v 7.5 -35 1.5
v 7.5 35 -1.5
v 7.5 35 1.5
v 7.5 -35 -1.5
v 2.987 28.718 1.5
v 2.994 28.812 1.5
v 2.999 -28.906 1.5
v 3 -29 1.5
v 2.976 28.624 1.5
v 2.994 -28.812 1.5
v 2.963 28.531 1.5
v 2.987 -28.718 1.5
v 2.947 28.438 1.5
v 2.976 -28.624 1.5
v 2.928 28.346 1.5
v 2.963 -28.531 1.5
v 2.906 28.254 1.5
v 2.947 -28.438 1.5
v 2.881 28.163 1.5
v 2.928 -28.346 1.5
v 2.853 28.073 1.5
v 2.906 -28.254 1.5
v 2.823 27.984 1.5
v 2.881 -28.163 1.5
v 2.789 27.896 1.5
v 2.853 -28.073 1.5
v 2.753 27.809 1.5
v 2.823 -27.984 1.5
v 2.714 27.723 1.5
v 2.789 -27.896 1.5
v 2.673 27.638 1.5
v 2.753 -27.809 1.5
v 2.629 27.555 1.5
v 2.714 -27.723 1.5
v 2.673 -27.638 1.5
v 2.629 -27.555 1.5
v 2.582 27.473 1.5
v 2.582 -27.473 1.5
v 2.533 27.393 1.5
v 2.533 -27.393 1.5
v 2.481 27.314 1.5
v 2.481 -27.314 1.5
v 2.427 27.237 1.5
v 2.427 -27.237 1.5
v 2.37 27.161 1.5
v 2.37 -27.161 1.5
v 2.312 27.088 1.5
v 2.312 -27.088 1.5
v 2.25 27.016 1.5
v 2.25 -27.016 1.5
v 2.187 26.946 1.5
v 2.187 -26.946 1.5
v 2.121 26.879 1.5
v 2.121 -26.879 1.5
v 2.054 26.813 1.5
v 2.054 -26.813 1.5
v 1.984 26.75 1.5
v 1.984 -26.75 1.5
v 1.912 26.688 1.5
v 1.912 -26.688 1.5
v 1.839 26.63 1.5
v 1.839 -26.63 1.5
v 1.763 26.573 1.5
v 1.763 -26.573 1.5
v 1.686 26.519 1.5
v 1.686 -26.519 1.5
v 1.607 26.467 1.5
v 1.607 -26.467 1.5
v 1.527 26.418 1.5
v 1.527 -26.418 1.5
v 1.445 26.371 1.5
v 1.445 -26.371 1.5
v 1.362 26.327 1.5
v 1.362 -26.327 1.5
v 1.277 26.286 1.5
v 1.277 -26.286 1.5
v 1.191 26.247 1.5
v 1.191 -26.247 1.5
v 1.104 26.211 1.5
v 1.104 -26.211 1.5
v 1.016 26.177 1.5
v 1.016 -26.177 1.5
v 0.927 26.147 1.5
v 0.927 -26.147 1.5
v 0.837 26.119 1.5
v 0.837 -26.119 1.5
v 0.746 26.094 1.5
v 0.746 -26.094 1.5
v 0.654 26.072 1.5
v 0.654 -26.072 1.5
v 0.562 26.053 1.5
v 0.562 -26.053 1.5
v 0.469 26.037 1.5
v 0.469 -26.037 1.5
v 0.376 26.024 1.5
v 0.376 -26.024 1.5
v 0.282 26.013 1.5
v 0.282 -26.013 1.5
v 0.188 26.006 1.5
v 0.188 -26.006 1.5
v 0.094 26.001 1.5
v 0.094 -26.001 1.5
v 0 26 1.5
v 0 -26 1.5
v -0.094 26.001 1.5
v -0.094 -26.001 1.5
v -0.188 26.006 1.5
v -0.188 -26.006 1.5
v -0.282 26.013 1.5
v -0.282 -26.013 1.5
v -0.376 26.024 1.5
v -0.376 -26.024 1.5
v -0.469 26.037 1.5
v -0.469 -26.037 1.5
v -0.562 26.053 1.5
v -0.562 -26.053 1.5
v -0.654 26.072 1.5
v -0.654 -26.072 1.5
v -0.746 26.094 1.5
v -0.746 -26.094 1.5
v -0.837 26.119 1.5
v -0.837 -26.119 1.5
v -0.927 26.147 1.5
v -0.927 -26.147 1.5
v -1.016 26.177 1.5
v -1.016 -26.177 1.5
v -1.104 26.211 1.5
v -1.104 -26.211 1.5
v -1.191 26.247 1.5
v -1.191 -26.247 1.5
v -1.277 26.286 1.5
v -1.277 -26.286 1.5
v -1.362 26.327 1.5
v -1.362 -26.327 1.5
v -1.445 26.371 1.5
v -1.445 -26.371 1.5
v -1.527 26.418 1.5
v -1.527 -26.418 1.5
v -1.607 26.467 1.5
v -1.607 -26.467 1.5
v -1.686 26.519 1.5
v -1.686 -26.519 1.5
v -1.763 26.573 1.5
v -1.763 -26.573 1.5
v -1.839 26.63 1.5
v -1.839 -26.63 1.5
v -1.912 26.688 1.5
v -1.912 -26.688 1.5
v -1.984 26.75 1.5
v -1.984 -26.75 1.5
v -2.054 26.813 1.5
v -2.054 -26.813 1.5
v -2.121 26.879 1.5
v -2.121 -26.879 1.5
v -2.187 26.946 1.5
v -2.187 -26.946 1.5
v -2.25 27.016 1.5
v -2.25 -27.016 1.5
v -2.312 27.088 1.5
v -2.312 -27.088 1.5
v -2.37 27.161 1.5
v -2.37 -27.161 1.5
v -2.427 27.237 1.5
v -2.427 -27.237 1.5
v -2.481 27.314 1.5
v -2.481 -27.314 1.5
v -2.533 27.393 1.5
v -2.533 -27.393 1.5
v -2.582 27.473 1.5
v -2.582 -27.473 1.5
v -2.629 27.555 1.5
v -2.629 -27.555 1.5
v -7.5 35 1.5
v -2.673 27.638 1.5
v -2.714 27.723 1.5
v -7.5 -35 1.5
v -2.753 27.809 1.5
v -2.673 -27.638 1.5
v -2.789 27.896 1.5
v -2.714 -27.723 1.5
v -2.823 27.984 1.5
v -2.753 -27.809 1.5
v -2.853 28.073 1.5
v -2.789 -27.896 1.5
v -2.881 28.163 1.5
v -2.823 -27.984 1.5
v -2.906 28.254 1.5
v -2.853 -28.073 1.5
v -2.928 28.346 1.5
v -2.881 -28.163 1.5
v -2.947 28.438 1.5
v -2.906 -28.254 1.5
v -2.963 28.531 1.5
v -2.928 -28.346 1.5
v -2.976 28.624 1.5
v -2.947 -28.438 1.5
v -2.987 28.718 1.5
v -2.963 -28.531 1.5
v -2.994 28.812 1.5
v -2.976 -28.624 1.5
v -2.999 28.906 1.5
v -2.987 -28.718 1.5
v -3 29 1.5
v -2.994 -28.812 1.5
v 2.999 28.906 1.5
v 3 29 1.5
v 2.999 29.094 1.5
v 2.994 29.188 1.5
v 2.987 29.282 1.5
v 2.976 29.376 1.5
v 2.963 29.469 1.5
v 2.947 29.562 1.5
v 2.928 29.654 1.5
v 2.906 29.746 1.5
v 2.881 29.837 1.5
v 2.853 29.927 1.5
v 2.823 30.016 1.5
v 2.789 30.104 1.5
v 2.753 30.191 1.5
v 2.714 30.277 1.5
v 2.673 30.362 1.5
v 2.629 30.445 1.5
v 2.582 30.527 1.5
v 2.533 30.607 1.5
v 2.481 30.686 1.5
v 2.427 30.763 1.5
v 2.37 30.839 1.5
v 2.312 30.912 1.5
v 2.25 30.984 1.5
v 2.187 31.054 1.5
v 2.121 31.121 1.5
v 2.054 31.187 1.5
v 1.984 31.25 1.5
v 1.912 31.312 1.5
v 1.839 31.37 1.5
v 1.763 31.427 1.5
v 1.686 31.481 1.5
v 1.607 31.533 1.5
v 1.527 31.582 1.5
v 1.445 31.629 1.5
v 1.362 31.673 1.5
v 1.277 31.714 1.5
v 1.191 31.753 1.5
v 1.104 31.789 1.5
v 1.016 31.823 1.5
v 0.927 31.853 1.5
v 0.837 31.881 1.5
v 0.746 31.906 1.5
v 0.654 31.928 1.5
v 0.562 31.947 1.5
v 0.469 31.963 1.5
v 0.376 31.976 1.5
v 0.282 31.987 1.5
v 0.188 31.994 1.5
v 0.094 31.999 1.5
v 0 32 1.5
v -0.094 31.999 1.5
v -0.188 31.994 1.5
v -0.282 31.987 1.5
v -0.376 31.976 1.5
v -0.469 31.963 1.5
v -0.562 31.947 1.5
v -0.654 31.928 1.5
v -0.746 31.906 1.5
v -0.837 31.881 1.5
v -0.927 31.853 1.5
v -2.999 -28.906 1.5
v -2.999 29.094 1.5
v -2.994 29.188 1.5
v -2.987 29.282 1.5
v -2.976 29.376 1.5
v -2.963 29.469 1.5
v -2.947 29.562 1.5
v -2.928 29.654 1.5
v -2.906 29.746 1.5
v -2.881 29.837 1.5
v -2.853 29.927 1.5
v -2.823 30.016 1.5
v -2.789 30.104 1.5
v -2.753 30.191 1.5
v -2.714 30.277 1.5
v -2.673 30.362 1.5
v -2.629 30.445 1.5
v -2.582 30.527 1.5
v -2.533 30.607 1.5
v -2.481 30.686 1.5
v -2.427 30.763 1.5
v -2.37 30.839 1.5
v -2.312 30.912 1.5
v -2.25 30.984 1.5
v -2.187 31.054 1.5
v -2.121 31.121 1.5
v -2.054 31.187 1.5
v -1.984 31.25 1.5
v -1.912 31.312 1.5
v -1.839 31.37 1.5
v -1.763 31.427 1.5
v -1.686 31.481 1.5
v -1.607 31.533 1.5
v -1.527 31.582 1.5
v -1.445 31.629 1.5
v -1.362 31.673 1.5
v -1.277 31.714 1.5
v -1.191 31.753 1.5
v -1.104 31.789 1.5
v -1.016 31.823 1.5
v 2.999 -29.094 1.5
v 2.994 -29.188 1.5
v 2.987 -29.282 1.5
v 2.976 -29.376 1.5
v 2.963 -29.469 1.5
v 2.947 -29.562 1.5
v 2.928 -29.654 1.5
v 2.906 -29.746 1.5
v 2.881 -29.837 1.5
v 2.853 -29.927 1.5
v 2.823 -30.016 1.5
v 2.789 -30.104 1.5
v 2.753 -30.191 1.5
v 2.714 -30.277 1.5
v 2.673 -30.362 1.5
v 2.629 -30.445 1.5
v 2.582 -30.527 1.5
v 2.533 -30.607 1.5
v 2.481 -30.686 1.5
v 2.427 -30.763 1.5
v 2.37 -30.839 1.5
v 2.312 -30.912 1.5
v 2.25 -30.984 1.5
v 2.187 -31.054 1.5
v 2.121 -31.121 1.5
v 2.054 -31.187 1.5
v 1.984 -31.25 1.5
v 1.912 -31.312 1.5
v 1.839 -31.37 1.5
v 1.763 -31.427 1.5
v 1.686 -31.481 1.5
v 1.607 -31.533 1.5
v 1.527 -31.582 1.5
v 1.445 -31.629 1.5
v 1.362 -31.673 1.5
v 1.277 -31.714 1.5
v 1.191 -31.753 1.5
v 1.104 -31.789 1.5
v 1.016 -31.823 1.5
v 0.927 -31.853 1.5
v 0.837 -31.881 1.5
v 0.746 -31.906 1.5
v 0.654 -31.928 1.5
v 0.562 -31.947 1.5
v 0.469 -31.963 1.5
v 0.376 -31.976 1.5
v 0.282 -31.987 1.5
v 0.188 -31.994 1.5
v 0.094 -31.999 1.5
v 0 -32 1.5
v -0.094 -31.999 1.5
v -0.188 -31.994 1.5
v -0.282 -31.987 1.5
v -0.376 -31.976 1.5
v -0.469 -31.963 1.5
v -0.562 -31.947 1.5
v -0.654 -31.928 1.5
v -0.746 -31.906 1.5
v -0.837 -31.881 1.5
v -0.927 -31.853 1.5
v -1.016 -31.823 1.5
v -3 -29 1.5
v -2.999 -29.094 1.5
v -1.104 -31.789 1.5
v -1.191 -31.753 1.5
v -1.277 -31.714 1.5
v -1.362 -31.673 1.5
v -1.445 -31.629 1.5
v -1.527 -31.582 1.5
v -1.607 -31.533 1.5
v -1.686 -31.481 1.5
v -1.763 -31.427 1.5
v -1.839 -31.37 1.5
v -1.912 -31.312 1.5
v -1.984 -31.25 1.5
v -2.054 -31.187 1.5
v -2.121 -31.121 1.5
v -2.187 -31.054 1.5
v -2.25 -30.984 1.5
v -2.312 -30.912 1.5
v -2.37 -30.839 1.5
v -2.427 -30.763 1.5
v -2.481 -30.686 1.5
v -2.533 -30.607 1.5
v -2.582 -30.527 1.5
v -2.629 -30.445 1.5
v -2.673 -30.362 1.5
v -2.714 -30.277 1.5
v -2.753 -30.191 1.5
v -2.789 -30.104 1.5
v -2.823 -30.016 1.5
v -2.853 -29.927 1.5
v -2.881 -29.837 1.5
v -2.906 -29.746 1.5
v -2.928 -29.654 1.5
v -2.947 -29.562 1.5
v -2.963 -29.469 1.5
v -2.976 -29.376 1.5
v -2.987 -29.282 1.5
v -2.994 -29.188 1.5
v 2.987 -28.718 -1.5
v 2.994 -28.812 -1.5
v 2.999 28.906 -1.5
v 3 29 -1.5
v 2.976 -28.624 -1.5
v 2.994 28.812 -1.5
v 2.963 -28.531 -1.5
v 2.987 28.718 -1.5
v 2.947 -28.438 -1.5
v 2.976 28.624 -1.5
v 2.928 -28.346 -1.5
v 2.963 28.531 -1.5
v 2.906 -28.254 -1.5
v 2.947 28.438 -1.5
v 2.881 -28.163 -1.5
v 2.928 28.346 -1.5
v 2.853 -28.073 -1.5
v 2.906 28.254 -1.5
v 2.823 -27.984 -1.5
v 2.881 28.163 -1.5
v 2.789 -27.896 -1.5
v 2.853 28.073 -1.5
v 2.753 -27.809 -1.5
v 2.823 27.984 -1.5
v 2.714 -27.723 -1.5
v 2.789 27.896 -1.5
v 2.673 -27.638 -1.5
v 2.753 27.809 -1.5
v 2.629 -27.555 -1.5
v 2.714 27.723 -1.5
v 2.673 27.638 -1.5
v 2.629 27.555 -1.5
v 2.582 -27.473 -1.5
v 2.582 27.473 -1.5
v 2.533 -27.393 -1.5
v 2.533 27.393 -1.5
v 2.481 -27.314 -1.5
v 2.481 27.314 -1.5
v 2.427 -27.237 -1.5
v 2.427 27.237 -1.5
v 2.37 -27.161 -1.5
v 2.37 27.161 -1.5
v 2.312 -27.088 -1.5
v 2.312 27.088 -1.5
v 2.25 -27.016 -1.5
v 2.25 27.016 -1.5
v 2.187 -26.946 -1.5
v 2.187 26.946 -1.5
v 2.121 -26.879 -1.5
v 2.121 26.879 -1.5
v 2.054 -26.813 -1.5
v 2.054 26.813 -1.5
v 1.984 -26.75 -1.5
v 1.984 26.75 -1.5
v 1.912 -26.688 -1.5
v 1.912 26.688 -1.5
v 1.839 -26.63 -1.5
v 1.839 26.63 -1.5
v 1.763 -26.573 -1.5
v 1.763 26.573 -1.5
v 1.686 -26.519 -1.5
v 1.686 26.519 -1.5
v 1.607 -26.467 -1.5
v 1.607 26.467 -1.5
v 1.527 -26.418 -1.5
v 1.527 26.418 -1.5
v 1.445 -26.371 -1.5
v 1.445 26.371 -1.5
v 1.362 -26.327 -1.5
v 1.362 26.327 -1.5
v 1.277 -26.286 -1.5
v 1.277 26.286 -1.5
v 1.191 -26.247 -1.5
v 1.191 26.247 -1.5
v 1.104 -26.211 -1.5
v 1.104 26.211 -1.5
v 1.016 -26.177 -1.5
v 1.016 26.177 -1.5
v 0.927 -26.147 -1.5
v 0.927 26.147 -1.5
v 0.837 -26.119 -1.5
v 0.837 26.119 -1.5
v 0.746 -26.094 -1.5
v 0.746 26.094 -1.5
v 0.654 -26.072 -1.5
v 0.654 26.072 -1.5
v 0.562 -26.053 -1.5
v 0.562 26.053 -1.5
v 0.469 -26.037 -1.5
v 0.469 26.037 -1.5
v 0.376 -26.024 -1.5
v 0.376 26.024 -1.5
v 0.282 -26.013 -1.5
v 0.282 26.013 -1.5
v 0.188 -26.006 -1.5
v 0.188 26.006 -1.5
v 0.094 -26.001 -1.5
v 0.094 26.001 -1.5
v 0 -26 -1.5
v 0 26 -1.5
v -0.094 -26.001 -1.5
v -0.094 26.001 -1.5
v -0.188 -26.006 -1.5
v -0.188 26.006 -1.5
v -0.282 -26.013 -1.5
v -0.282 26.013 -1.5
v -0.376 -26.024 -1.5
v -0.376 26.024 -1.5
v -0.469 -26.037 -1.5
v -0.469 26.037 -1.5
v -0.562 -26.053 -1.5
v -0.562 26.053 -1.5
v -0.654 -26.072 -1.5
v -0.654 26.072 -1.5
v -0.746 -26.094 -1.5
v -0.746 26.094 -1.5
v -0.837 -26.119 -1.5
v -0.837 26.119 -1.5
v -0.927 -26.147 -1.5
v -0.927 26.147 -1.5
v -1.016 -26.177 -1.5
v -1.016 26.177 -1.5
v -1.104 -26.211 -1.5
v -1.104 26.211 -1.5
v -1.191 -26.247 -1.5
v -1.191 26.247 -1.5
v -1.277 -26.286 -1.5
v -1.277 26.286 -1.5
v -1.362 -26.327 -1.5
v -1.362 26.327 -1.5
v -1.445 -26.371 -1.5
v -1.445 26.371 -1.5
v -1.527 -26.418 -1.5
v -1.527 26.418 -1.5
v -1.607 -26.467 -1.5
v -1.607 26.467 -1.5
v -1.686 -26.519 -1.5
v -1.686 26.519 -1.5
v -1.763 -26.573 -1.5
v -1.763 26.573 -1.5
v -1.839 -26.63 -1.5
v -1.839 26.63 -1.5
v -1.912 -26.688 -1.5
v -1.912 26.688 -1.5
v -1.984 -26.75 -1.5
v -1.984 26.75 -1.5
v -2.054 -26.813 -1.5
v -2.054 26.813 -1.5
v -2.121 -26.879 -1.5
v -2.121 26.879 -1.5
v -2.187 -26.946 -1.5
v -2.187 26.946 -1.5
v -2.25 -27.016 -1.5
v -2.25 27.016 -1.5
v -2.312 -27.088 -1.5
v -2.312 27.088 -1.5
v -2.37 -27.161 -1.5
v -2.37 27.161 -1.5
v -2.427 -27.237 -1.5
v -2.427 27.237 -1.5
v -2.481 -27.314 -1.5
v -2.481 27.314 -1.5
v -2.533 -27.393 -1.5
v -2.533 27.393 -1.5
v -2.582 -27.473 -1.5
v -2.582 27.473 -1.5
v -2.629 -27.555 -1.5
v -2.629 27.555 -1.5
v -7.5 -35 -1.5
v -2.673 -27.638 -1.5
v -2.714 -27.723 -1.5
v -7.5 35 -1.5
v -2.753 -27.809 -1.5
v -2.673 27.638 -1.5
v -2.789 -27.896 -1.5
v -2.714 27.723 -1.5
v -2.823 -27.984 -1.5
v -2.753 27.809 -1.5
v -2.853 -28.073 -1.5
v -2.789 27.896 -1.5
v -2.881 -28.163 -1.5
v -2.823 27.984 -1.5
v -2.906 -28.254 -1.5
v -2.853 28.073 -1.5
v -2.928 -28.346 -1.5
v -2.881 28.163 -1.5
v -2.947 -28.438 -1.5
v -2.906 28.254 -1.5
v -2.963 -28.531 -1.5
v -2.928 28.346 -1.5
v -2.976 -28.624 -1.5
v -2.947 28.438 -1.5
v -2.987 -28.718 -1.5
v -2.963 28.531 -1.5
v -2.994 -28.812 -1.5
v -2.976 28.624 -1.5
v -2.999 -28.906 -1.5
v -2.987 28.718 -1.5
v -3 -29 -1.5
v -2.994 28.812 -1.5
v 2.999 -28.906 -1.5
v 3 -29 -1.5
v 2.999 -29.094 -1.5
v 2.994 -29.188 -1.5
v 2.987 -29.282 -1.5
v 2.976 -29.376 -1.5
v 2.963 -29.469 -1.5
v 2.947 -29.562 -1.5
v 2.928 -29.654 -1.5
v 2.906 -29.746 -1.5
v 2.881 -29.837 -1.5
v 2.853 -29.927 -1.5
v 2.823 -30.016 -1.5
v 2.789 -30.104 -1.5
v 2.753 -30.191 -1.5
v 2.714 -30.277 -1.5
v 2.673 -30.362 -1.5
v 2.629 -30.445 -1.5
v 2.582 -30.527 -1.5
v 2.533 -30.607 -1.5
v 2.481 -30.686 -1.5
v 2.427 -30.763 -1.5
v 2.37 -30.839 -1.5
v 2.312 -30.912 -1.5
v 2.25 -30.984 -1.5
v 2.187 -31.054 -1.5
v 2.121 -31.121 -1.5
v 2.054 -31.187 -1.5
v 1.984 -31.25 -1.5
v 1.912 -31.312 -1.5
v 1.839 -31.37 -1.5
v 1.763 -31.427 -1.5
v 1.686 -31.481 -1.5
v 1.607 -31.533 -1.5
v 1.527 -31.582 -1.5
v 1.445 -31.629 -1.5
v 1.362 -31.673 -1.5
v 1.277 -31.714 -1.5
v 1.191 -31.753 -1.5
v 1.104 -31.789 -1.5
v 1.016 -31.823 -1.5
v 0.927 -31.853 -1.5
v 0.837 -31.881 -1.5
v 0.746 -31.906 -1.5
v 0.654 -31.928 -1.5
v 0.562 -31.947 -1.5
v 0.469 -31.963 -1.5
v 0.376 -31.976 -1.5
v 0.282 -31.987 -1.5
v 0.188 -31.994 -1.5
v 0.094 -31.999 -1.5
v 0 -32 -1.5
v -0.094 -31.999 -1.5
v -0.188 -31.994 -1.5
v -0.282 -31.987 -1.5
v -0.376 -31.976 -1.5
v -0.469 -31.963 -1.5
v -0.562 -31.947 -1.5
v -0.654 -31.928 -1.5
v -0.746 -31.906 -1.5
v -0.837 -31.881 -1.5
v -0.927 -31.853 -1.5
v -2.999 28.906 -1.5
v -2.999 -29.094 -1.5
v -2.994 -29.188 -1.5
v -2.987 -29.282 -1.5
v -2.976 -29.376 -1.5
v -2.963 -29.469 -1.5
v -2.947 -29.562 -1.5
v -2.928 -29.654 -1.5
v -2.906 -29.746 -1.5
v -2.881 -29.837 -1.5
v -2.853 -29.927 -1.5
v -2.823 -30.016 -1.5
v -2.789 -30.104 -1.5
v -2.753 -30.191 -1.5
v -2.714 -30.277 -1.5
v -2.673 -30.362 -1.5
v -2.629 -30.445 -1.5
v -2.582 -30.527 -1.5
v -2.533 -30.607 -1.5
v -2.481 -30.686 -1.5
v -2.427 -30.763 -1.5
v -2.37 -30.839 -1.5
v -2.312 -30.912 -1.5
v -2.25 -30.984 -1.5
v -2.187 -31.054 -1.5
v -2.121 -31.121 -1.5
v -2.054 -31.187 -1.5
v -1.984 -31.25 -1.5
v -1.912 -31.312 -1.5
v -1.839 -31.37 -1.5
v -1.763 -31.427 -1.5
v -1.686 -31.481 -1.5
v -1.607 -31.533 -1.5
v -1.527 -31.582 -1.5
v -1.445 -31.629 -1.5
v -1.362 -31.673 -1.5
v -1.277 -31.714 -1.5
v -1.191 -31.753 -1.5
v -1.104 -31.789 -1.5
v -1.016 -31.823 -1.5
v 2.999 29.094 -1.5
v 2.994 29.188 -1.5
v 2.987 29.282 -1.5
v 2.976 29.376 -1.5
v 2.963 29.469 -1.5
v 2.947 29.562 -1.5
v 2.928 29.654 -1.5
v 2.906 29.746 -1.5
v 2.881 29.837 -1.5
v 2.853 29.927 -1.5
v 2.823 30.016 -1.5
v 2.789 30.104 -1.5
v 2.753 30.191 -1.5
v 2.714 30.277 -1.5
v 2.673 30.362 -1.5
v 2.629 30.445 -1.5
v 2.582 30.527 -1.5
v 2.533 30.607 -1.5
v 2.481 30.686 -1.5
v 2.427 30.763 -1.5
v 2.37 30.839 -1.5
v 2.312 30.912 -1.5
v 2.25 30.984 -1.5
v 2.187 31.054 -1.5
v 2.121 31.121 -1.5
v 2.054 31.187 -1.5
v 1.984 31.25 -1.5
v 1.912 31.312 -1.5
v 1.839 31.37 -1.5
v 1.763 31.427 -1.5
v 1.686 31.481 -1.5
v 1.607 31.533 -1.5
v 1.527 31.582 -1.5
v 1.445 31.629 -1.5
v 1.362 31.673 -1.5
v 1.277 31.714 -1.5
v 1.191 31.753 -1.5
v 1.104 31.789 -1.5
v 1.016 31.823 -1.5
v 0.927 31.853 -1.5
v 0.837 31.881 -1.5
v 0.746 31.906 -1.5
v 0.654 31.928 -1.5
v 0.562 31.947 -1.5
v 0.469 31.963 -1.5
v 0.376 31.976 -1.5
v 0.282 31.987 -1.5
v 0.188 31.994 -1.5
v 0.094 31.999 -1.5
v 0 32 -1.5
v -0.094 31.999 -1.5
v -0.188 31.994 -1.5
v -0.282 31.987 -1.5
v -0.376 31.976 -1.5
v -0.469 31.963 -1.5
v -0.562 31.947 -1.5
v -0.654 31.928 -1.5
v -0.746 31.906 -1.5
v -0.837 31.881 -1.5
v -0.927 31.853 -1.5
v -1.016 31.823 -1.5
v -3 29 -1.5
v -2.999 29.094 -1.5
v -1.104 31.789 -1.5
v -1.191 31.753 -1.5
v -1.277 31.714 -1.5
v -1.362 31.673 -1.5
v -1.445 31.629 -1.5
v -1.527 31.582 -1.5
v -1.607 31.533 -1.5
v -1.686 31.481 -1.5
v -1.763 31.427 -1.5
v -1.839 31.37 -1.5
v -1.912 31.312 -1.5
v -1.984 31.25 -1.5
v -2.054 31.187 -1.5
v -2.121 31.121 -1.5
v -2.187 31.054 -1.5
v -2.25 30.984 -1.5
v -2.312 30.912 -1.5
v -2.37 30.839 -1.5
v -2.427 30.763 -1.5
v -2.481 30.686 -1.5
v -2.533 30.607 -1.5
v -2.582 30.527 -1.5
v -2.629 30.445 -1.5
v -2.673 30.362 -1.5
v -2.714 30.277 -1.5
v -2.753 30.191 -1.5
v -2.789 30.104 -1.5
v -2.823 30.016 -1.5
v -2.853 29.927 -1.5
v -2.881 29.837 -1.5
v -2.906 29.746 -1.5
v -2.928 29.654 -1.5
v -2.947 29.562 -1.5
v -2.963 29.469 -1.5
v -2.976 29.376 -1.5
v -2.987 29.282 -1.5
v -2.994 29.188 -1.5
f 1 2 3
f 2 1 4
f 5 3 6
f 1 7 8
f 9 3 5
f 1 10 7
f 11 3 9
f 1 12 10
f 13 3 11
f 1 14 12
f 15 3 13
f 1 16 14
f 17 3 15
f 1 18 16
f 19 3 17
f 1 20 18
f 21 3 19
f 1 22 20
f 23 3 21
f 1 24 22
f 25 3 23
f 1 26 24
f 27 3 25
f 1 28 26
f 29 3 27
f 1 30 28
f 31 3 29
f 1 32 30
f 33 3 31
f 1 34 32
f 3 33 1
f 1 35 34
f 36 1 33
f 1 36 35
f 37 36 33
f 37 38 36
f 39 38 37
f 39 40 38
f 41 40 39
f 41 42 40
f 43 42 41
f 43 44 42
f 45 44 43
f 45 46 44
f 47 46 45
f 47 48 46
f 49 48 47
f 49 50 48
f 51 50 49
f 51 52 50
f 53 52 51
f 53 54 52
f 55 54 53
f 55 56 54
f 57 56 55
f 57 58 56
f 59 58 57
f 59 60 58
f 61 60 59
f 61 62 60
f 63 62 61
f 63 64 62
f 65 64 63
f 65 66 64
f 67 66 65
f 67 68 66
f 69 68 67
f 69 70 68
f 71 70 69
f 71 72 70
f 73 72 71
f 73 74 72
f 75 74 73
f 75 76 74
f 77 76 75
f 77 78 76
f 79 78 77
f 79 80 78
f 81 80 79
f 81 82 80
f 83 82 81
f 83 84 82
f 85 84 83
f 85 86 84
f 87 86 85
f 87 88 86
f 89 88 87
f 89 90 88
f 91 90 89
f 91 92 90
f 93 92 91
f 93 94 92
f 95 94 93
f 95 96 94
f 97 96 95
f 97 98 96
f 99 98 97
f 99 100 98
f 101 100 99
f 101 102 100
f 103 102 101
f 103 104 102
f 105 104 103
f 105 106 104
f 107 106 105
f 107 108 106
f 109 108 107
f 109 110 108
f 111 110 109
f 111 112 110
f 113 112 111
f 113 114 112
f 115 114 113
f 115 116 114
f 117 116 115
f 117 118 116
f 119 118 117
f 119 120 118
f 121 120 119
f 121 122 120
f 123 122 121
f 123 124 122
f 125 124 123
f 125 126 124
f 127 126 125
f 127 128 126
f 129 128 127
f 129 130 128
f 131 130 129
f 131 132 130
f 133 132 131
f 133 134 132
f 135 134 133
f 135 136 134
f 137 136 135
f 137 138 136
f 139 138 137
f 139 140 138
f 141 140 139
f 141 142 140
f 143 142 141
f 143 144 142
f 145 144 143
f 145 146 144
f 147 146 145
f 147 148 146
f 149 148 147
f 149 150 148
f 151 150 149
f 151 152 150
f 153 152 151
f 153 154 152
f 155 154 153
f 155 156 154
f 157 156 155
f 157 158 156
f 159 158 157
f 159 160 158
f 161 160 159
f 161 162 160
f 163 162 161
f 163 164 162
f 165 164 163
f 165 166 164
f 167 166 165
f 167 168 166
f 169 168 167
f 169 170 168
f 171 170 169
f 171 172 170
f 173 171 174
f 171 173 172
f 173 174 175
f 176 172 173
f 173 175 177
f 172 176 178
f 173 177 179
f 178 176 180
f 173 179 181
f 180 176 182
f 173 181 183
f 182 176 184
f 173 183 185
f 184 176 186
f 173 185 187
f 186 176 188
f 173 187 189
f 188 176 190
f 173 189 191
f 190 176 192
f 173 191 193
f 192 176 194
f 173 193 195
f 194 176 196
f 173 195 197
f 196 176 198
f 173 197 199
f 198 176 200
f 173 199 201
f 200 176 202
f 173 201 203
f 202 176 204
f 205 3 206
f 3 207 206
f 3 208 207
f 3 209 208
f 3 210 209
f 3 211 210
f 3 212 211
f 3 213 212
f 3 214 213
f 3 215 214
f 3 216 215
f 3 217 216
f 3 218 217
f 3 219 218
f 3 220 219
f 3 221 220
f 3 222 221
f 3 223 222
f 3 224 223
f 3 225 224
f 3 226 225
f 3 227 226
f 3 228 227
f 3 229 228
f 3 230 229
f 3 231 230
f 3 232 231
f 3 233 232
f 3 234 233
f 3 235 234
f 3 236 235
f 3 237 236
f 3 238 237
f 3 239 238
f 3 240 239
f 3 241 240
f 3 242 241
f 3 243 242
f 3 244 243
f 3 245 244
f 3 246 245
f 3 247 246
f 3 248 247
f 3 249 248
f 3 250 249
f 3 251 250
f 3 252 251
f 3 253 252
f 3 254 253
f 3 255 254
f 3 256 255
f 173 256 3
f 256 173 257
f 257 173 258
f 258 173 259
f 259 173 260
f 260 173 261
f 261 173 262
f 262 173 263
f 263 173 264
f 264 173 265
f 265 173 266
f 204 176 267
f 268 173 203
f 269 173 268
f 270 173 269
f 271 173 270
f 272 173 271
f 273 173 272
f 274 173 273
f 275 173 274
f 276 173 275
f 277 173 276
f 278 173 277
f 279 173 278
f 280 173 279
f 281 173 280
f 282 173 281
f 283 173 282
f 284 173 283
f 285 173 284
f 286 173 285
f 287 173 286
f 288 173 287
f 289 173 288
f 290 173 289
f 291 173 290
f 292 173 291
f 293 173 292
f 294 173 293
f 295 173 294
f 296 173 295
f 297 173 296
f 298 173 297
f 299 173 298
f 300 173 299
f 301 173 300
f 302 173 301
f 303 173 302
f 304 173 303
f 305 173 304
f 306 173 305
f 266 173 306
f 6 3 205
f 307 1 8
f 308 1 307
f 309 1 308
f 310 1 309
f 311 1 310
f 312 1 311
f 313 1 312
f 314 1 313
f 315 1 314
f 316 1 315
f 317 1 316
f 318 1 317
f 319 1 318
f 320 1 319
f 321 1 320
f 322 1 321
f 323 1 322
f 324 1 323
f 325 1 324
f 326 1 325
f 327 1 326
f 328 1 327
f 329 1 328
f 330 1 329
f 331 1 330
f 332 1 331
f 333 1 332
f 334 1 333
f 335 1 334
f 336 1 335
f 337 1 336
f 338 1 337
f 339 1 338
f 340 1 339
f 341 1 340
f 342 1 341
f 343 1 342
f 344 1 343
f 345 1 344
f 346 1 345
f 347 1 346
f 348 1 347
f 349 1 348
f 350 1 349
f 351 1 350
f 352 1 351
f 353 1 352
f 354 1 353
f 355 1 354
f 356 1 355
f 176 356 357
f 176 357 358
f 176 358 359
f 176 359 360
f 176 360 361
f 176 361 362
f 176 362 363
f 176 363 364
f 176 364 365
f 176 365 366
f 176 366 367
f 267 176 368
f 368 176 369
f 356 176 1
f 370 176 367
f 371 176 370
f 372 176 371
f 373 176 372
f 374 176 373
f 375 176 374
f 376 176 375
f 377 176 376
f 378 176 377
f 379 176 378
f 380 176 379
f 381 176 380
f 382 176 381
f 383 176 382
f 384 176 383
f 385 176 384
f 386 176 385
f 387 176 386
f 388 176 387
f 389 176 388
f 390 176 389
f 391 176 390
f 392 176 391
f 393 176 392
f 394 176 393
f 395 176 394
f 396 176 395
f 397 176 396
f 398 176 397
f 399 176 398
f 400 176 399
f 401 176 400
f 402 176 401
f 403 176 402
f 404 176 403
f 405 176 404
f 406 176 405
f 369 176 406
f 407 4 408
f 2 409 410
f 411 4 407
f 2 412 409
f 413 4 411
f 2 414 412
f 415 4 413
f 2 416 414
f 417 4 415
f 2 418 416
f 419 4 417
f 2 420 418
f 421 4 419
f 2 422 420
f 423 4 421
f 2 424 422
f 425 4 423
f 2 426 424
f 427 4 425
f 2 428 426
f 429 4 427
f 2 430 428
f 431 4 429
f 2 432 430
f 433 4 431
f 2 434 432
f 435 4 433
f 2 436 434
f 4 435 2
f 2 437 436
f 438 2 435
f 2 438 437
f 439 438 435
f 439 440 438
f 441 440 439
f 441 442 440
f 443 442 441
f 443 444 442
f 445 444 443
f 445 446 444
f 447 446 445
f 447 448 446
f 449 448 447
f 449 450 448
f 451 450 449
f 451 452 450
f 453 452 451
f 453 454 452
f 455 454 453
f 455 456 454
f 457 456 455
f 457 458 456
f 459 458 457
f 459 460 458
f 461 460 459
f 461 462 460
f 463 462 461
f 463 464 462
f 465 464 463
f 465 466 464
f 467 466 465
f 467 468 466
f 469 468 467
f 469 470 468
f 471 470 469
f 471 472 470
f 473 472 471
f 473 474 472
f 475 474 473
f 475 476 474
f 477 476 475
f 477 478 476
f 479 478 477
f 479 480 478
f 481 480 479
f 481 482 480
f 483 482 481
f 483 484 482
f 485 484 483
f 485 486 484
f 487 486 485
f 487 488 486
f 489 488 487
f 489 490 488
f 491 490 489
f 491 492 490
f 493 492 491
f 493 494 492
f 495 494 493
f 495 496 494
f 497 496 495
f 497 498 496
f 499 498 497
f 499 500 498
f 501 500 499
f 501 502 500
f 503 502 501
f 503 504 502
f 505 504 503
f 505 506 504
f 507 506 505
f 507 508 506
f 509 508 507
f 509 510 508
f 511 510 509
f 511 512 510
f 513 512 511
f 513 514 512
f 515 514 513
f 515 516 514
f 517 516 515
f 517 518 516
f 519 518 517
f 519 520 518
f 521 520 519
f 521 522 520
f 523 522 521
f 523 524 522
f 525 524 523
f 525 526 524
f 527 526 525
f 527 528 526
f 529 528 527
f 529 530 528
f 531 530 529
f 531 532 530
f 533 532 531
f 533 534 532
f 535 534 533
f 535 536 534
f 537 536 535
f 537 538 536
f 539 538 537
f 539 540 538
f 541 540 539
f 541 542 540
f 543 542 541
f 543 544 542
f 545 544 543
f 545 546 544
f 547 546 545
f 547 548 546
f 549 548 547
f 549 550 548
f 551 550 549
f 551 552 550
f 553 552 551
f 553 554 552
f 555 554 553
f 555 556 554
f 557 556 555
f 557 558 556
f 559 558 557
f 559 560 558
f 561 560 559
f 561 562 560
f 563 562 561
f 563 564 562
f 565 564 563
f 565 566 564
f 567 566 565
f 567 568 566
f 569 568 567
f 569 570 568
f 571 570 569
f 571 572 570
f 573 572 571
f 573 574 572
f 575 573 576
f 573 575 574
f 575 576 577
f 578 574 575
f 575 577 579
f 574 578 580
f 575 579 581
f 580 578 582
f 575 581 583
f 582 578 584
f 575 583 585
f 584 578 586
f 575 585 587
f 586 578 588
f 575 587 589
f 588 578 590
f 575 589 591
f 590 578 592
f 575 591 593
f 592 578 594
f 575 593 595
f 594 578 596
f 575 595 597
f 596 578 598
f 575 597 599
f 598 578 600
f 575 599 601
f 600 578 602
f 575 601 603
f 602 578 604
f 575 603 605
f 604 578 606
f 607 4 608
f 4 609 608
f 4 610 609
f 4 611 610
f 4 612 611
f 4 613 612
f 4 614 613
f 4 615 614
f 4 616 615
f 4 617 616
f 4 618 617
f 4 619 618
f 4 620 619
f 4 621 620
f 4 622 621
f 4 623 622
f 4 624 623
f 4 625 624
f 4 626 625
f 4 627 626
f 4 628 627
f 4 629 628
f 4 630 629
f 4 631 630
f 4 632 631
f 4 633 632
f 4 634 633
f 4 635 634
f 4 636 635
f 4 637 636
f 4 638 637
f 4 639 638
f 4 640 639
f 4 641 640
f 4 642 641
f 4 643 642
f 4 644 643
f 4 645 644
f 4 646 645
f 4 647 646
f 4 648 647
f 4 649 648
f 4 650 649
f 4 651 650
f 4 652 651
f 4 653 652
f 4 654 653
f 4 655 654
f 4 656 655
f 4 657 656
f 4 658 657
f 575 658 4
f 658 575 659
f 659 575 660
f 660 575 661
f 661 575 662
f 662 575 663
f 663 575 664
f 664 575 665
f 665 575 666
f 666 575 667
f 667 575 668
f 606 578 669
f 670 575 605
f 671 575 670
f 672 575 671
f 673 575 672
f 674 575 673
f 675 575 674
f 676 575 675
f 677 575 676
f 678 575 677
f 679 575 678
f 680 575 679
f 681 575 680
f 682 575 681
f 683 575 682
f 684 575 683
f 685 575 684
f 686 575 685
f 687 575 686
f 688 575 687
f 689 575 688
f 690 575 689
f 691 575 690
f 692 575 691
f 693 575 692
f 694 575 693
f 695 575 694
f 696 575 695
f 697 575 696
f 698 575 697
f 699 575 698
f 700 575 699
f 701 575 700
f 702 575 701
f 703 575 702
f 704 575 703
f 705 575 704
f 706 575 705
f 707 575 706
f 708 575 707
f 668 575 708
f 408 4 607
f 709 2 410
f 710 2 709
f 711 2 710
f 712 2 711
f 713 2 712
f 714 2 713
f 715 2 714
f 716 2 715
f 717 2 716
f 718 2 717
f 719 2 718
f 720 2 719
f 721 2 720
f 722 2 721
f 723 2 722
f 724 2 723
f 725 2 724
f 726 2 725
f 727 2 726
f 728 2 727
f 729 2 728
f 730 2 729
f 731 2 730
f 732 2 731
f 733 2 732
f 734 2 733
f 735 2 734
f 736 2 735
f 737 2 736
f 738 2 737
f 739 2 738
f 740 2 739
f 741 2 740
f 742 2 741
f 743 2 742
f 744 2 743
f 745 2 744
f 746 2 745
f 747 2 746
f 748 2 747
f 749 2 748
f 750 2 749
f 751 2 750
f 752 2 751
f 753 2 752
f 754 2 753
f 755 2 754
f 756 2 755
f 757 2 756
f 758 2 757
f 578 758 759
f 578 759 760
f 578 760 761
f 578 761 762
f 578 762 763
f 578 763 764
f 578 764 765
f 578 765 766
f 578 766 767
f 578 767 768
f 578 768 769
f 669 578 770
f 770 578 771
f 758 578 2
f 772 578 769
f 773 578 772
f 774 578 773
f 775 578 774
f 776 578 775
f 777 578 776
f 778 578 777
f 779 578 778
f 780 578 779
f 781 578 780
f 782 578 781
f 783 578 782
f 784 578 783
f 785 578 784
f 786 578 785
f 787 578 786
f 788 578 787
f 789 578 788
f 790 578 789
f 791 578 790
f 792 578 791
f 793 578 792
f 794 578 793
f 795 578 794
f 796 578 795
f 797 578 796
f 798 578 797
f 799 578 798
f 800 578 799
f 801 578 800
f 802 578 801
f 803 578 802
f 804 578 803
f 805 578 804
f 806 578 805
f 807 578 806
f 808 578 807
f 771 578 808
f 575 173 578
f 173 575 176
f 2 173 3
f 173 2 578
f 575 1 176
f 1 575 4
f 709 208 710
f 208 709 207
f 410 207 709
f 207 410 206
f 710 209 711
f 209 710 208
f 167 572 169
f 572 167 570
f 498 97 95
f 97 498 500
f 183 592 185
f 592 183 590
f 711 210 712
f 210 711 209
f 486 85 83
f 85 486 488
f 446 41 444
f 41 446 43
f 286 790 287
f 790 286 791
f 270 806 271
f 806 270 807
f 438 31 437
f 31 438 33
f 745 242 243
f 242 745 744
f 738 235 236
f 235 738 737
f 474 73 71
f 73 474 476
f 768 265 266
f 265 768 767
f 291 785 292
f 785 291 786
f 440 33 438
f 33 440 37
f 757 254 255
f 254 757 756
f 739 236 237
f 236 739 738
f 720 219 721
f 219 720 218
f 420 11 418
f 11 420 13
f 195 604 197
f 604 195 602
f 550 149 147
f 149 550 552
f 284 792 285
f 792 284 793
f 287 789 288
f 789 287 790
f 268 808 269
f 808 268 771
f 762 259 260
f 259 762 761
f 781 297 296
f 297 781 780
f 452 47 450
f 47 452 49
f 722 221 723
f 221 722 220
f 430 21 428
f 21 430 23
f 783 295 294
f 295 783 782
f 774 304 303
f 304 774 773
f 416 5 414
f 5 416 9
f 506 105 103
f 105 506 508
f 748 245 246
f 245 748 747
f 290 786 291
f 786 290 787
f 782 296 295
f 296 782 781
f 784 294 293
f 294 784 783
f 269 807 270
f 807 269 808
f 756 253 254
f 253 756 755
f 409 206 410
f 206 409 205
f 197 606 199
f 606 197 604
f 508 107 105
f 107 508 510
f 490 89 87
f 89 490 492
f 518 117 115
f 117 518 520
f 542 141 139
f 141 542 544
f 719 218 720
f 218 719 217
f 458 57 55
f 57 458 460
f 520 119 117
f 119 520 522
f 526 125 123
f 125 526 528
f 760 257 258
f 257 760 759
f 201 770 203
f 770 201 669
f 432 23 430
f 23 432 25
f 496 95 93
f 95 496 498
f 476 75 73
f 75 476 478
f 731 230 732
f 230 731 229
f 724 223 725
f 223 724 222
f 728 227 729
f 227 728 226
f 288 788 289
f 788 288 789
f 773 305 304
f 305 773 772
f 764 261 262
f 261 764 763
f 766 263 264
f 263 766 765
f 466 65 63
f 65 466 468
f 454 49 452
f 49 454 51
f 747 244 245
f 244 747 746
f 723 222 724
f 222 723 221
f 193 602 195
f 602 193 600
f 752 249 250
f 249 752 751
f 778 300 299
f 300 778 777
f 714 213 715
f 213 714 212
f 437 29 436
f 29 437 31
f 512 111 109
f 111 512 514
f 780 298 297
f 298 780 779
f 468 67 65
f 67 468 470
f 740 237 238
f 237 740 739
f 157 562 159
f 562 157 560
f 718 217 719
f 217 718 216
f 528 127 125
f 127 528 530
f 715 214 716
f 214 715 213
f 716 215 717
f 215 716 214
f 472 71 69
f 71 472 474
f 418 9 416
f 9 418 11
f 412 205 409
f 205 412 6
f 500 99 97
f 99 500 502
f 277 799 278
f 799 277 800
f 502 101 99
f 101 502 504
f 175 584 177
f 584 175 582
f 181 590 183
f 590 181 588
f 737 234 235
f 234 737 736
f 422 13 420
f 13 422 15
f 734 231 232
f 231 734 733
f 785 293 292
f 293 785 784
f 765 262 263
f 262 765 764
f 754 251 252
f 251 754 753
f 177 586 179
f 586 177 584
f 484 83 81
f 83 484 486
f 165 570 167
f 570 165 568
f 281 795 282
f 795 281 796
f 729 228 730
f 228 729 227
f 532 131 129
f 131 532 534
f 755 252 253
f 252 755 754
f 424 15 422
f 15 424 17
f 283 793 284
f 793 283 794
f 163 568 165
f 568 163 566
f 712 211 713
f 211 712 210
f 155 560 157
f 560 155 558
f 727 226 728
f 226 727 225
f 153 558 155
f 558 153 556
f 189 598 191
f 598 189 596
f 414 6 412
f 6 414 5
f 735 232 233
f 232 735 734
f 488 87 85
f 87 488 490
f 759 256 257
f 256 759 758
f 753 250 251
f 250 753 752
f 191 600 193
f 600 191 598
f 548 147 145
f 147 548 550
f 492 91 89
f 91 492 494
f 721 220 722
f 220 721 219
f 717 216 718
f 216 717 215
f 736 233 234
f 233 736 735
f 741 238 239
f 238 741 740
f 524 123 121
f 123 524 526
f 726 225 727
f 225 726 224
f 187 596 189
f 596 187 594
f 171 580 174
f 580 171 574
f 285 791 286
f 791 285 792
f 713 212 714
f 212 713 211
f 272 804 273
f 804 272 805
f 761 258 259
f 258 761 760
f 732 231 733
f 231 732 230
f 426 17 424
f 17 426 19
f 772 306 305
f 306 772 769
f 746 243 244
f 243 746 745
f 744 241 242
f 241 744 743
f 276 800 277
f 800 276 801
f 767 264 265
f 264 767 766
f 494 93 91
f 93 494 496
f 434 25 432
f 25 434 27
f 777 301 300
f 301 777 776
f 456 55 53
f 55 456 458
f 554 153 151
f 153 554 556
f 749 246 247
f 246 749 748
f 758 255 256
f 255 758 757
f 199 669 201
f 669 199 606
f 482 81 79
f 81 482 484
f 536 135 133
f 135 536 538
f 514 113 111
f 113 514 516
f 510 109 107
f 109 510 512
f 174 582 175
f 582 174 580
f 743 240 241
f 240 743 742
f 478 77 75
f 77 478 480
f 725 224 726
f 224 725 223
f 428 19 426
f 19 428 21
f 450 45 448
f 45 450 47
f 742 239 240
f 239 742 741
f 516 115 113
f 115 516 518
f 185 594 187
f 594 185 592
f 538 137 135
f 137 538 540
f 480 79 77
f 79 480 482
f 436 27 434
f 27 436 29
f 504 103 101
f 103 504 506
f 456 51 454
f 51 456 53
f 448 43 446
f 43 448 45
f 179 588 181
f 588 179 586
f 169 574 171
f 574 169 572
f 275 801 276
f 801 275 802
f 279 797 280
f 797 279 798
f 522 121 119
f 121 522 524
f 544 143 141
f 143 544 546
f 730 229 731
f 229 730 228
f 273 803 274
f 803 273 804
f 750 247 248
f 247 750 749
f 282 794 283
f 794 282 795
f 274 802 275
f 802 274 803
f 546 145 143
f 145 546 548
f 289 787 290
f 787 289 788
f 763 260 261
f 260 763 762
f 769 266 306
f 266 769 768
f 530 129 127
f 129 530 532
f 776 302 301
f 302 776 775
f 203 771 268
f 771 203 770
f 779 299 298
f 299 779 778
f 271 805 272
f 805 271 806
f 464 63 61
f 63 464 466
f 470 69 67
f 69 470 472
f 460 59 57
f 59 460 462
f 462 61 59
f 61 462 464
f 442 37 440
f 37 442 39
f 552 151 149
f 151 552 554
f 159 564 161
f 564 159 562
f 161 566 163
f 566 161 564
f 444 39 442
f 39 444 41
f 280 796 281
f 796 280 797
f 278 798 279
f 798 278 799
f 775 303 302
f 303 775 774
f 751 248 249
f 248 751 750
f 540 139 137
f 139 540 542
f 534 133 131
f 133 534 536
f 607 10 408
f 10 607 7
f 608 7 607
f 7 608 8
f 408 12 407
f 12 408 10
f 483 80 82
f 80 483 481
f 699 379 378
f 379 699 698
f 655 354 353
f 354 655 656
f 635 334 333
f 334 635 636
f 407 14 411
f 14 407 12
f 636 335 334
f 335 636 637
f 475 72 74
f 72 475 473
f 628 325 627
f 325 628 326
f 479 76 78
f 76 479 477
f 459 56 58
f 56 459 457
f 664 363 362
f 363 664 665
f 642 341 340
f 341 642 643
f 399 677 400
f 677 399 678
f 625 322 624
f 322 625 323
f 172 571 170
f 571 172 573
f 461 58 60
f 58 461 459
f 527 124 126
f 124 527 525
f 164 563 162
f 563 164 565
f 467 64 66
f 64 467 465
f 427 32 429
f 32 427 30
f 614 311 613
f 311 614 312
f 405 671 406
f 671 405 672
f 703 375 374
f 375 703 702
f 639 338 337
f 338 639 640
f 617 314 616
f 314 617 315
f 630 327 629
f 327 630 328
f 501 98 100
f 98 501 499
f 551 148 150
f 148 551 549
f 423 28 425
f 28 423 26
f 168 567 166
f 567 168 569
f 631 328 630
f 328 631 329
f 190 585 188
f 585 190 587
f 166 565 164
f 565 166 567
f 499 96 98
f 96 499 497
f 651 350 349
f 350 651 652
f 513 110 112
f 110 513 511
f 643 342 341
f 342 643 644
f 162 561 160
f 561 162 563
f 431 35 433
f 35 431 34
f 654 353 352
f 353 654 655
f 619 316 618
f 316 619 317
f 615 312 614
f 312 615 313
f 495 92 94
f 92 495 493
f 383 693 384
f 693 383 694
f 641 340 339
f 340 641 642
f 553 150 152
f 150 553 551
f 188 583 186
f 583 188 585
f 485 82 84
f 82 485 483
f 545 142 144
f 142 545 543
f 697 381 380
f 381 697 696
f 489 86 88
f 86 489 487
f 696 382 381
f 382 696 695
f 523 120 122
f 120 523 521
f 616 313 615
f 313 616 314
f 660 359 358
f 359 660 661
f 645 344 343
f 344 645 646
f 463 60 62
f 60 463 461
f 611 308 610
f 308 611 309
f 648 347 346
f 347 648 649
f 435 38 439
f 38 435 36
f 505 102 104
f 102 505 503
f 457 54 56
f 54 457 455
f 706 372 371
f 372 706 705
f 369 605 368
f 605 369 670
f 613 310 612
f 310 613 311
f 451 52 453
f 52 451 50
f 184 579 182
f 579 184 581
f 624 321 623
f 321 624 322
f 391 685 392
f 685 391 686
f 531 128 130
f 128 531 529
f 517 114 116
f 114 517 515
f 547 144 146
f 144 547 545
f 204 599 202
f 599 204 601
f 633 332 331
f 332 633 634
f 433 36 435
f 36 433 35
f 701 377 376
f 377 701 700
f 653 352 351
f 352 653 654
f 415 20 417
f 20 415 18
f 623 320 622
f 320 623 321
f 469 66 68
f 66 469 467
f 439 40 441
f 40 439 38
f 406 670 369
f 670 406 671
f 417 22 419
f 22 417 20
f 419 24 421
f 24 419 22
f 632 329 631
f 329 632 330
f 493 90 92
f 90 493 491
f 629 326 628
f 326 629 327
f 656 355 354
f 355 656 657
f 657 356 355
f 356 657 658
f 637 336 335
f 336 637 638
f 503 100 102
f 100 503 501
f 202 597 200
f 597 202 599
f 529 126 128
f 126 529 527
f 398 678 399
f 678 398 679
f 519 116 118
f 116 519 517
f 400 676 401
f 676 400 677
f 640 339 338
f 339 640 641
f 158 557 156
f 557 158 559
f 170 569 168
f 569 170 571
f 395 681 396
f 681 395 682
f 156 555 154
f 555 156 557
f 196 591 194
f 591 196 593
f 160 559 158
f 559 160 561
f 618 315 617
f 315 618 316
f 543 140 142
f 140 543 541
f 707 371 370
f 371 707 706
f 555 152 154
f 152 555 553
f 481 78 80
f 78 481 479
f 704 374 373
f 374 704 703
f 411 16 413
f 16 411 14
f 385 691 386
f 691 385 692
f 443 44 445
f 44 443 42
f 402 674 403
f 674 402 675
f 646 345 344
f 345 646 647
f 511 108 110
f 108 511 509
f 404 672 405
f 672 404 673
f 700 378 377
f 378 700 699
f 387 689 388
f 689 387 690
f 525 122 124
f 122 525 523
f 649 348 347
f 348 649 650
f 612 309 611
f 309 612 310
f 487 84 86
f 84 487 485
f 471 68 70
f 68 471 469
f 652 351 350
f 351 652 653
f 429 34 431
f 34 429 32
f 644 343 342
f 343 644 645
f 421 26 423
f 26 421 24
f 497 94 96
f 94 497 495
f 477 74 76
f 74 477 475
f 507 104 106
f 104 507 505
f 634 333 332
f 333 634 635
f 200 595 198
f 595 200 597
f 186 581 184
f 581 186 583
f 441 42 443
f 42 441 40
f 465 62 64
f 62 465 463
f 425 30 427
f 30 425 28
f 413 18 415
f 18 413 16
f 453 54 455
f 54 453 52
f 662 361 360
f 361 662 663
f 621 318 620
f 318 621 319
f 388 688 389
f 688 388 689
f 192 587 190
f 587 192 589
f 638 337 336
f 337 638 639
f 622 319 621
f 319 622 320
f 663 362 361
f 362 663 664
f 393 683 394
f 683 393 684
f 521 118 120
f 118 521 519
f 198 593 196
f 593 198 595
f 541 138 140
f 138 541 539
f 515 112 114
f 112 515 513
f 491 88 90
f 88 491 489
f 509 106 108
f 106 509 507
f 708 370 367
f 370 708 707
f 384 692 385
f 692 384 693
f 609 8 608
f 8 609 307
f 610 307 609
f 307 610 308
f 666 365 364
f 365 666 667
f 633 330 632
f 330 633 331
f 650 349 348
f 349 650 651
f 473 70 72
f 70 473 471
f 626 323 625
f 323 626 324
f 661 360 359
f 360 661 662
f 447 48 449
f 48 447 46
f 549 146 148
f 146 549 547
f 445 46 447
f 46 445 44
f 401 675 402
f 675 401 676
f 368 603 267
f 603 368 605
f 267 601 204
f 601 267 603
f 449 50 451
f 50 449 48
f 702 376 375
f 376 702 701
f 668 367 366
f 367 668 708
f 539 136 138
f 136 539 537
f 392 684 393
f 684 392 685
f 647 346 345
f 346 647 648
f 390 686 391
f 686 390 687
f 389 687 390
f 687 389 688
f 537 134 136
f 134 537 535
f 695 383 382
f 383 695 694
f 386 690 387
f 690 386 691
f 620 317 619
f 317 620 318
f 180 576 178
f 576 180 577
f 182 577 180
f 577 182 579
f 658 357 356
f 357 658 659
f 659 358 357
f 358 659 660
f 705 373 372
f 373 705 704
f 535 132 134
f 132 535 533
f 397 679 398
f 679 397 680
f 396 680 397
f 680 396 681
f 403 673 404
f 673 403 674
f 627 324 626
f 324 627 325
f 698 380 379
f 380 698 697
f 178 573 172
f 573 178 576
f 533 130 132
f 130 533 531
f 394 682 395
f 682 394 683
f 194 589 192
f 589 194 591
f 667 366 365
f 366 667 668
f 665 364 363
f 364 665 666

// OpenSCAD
y_base = 70;
x_base = 15;
z_base = 3;

h_tornillo = z_base+4;
r_tornillo = 3;

marge_borde_con_tornillo = 3;

difference(){
    cube([x_base, y_base, z_base], center = true);
    translate([0, (y_base/2) - r_tornillo - marge_borde_con_tornillo, -1]){
        cylinder(r=r_tornillo, h=h_tornillo, $fn=200, center = true);
    }
    translate([0, -(y_base/2) + r_tornillo + marge_borde_con_tornillo, -1]){
        cylinder(r=r_tornillo, h=h_tornillo, $fn=200, center = true);
    }
}
